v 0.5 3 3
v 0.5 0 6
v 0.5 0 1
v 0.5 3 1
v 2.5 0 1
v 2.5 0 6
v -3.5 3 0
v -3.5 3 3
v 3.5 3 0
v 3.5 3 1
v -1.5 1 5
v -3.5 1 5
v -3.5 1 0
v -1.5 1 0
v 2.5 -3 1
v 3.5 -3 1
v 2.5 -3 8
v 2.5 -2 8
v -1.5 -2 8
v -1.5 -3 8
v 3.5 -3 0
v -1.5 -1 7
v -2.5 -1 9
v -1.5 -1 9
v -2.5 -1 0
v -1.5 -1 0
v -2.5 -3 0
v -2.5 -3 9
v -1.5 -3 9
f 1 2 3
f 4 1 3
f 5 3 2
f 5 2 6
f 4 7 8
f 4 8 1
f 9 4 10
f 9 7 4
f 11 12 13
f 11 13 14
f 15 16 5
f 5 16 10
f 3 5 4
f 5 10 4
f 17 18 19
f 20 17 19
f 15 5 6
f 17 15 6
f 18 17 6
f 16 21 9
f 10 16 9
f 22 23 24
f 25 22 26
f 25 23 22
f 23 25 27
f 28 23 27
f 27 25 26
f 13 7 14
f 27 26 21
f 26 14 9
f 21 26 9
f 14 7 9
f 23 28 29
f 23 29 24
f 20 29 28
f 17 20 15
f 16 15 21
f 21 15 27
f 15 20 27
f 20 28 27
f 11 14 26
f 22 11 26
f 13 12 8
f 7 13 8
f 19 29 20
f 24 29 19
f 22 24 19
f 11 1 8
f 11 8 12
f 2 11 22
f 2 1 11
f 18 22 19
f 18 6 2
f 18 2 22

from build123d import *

# Parameters (mm, degrees)
SKETCH1_W           = 7
SKETCH1_H           = 6
BOSS_EXTRUDE1_DEPTH = 9
SKETCH2_W           = 3
SKETCH2_H           = 5
CUT_EXTRUDE1_DEPTH  = 3
CUT_EXTRUDE2_DEPTH  = 7
SKETCH4_W           = 1
SKETCH4_H           = 2
BOSS_EXTRUDE2_DEPTH = 1
CUT_EXTRUDE3_DEPTH  = 10
CUT_EXTRUDE5_DEPTH  = 4
CUT_EXTRUDE6_DEPTH  = 3


with BuildPart() as part:
    # Sketch1 → Boss-Extrude1 (new body)
    with BuildSketch(Plane.XY):
        Rectangle(SKETCH1_W, SKETCH1_H)
    extrude(amount=BOSS_EXTRUDE1_DEPTH)

    # Sketch2 → Cut-Extrude1 (cut)
    with BuildSketch(Plane(origin=(0, 3, 0), x_dir=(1, 0, 0), z_dir=(0, 1, 0))):
        with Locations((2, -3.5)):
            Rectangle(SKETCH2_W, SKETCH2_H)
    extrude(amount=-CUT_EXTRUDE1_DEPTH, mode=Mode.SUBTRACT)

    # Sketch3 → Cut-Extrude2 (cut, through all)
    with BuildSketch(Plane(origin=(0, 3, 0), x_dir=(1, 0, 0), z_dir=(0, 1, 0))):
        Polygon((3.5, -1), (2.5, -1), (2.5, -8), (-2.5, -8), (-2.5, -9), (3.5, -9), align=None)
    extrude(amount=-CUT_EXTRUDE2_DEPTH, mode=Mode.SUBTRACT)

    # Sketch4 → Boss-Extrude2 (add)
    with BuildSketch(Plane(origin=(-2.5, 0, 0), x_dir=(0, 0, -1), z_dir=(1, 0, 0))):
        with Locations((-8.5, -2)):
            Rectangle(SKETCH4_W, SKETCH4_H)
    extrude(amount=BOSS_EXTRUDE2_DEPTH)

    # Sketch5 → Cut-Extrude3 (cut, through all)
    with BuildSketch(Plane.XY.offset(9)):
        Polygon((-3.5, 1), (-1.5, 1), (-1.5, -1), (-2.5, -1), (-2.5, -3), (-3.5, -3), align=None)
    extrude(amount=-CUT_EXTRUDE3_DEPTH, mode=Mode.SUBTRACT)

    # Sketch6 → Cut-Extrude5 (cut)
    with BuildSketch(Plane(origin=(2.5, 0, 0), x_dir=(0, 0, -1), z_dir=(1, 0, 0))):
        Polygon((-3, 3), (-8, -2), (-8, 1), (-9, 1), (-9, 3), align=None)
    extrude(amount=-CUT_EXTRUDE5_DEPTH, mode=Mode.SUBTRACT)

    # Sketch8 → Cut-Extrude6 (cut, through all)
    with BuildSketch(Plane(origin=(-1.5, 0, 0), x_dir=(0, 0, -1), z_dir=(1, 0, 0))):
        Polygon((-5, 1), (-3, 3), (-9, 3), (-9, 1), align=None)
    extrude(amount=-CUT_EXTRUDE6_DEPTH, mode=Mode.SUBTRACT)


solid = part.part
